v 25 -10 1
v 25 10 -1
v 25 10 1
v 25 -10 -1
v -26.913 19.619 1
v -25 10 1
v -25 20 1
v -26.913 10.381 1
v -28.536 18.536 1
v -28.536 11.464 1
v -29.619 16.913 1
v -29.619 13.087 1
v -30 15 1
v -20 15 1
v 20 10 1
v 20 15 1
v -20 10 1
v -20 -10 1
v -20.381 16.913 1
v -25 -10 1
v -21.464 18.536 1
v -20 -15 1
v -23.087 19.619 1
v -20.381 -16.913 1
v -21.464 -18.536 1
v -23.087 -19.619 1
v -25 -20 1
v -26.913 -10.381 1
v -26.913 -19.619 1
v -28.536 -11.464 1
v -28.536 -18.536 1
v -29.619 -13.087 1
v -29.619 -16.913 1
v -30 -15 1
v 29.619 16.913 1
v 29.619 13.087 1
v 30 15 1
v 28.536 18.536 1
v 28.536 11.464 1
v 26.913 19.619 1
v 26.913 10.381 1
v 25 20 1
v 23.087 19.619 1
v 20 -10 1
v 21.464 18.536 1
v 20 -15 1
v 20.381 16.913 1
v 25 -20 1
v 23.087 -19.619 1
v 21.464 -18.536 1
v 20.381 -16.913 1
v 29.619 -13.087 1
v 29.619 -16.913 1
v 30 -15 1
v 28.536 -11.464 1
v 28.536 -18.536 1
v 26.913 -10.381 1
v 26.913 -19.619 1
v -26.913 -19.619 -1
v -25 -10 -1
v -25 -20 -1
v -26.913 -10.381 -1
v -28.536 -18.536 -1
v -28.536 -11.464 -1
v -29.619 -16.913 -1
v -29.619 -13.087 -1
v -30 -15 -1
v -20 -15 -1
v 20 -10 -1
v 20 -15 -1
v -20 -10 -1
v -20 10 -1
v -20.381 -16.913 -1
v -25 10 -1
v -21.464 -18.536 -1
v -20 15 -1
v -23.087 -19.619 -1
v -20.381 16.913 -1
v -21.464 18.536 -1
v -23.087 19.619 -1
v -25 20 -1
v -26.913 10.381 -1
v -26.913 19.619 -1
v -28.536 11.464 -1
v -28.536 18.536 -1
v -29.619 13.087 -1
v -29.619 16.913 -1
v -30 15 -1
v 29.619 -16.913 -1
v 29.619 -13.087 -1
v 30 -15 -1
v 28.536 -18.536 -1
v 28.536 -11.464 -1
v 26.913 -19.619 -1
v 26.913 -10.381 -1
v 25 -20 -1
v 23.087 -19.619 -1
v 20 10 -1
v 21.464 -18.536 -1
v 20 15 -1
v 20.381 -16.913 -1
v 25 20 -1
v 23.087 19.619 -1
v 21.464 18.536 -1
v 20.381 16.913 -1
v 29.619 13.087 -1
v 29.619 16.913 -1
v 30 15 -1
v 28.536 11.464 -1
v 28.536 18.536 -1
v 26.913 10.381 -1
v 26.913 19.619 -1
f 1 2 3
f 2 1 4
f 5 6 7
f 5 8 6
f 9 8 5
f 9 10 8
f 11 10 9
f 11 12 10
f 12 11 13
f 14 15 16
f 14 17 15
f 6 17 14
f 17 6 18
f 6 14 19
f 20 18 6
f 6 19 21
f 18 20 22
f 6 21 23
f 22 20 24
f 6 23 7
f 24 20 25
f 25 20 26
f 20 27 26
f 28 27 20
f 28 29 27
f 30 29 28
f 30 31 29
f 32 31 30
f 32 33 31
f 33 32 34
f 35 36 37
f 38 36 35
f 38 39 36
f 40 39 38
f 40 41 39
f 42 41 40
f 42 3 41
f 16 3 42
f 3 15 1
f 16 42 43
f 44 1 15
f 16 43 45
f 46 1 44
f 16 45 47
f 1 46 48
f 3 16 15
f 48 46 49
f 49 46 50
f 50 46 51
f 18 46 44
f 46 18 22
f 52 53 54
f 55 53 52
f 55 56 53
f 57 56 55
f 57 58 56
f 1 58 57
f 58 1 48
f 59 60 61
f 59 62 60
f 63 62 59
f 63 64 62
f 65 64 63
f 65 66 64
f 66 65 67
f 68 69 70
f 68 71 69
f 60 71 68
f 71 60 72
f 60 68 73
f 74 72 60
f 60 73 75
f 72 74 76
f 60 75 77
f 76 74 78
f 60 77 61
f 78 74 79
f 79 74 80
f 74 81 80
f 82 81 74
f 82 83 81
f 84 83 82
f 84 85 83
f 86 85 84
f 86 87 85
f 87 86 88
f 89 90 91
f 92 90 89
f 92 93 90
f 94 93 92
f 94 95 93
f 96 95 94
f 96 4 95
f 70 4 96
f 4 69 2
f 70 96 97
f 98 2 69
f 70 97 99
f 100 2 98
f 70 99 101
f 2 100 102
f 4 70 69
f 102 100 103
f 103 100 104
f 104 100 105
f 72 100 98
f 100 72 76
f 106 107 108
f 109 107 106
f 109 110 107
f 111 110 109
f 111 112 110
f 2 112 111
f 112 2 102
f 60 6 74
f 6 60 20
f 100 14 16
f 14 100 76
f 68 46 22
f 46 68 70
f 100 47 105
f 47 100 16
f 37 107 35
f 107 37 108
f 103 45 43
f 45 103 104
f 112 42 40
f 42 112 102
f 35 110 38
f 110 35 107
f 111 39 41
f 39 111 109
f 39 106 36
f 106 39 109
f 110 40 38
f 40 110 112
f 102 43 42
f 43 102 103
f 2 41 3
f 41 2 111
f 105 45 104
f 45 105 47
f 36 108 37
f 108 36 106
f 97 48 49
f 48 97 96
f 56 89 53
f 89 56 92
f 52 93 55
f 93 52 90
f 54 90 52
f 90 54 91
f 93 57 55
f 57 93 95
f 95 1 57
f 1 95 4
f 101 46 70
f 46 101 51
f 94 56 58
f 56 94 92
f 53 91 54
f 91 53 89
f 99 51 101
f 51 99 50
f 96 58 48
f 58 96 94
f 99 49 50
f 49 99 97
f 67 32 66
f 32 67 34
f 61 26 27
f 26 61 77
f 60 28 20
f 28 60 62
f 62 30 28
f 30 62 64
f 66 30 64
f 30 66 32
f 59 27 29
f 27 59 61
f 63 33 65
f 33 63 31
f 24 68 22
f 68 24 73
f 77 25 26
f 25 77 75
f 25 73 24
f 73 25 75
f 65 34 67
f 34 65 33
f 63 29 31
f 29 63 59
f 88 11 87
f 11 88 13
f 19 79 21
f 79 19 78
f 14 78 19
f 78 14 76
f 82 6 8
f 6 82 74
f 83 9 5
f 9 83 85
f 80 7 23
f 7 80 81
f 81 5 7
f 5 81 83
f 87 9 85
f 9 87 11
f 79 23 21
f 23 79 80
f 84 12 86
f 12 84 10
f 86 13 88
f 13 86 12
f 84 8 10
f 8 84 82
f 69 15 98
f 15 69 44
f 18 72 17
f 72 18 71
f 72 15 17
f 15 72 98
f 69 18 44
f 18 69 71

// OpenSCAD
// Variable description

length      = 50    ;
width       = 30    ;
height      = 2     ;
diameter    = 10    ;
thickness   = 5     ;




  difference(){    
    union(){
        cube( size = [ length, width, height], center = true)   ;
        translate( [ length/2, width/2, 0] ){
            cylinder( h = height, d = diameter, center = true)  ;
        }
        translate( [ length/2, -width/2, 0] ){
            cylinder( h = height, d = diameter, center = true)  ;
        }
        translate( [ -length/2, -width/2, 0] ){
            cylinder( h = height, d = diameter, center = true)  ;
        }
        translate( [ -length/2, width/2, 0] ){
            cylinder( h = height, d = diameter, center = true)  ;
        }
    }
    
  cube( size = [ length-2*thickness, width-2*thickness, height+2], center = true) ; 
    
}   
    
    
    
    
